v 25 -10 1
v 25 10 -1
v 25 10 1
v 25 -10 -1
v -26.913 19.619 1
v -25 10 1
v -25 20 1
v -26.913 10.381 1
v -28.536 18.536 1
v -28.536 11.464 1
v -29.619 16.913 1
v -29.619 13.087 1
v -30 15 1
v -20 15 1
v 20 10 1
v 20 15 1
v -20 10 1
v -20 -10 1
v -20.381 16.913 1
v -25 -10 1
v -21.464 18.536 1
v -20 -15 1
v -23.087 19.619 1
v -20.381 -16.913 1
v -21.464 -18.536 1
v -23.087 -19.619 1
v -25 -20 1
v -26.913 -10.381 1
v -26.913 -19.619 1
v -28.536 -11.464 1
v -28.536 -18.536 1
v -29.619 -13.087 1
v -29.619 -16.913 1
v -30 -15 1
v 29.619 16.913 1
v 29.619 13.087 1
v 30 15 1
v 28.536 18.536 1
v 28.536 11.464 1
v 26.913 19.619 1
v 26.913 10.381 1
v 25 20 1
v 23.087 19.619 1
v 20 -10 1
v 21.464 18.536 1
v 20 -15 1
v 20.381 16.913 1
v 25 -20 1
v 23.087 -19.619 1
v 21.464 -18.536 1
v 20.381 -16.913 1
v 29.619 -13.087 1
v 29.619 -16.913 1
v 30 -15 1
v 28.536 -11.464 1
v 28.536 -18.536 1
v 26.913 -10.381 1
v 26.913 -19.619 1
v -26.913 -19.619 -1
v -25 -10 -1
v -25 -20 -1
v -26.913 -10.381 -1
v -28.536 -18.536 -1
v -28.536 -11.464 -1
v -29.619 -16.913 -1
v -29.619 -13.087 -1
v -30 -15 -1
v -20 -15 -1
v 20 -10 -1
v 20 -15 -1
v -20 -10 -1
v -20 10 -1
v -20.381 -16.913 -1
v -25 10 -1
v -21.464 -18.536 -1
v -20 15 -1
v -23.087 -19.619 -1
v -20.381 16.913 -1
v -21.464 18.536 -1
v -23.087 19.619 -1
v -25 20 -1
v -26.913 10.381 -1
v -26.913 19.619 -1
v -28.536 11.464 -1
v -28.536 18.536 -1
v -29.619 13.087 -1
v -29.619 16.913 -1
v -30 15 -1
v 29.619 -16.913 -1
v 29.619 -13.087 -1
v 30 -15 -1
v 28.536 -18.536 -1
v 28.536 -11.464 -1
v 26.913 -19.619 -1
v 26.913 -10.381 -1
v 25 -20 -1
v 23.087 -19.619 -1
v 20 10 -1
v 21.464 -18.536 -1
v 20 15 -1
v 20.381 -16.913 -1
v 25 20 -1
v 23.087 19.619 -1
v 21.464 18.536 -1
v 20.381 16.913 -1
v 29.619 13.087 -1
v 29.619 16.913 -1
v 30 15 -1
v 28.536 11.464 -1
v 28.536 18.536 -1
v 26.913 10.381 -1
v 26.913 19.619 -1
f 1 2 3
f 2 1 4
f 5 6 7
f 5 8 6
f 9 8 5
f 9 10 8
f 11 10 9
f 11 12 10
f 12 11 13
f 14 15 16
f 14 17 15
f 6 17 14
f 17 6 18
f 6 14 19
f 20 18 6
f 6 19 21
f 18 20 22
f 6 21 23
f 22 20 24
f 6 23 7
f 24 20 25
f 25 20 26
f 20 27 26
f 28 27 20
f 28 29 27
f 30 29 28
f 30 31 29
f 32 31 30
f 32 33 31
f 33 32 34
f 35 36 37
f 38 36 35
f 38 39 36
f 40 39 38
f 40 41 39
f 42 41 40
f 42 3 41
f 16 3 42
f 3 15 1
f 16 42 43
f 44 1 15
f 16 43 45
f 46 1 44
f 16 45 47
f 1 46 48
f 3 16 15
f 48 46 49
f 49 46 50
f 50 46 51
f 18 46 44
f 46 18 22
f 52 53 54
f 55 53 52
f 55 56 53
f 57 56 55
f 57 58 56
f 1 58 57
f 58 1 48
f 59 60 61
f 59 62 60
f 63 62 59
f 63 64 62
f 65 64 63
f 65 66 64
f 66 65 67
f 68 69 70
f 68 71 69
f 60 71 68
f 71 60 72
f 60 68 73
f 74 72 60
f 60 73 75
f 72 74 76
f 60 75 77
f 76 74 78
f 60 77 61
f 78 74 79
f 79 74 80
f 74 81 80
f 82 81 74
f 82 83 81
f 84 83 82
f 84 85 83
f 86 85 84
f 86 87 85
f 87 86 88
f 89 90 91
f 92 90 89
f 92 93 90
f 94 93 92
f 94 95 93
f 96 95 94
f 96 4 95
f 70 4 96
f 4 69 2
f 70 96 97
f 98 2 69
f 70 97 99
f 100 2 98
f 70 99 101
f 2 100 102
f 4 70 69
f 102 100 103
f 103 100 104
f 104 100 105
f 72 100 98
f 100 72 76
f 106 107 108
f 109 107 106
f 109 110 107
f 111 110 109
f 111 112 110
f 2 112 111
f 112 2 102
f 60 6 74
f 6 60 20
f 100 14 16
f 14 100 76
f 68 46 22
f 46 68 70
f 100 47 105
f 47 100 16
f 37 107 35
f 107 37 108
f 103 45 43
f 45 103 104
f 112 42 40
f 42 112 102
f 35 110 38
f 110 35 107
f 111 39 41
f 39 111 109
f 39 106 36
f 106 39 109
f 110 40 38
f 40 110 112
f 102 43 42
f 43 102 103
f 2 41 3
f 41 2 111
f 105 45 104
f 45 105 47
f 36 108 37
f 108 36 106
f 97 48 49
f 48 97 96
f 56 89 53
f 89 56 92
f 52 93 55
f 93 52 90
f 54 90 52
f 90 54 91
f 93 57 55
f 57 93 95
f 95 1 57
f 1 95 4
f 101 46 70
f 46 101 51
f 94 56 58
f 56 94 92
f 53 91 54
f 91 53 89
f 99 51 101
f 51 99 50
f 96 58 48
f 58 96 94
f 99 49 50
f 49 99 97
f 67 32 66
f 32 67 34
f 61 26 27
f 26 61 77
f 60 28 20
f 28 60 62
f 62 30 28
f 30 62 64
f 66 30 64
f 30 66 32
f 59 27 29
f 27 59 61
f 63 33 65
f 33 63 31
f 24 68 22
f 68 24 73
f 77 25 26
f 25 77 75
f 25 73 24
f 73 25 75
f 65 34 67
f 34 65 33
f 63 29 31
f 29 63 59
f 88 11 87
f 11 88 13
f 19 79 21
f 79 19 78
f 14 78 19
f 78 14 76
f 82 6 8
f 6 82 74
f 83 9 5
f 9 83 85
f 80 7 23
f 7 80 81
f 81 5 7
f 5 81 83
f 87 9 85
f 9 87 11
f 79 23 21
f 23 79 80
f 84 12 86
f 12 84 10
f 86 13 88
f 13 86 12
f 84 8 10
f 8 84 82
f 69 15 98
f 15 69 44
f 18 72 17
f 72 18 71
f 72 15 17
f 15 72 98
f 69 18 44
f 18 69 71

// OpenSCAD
// Variable description

length      = 50    ;
width       = 30    ;
height      = 2     ;
diameter    = 10    ;
thickness   = 5     ;




  difference(){    
    union(){
        cube( size = [ length, width, height], center = true)   ;
        translate( [ length/2, width/2, 0] ){
            cylinder( h = height, d = diameter, center = true)  ;
        }
        translate( [ length/2, -width/2, 0] ){
            cylinder( h = height, d = diameter, center = true)  ;
        }
        translate( [ -length/2, -width/2, 0] ){
            cylinder( h = height, d = diameter, center = true)  ;
        }
        translate( [ -length/2, width/2, 0] ){
            cylinder( h = height, d = diameter, center = true)  ;
        }
    }
    
  cube( size = [ length-2*thickness, width-2*thickness, height+2], center = true) ; 
    
}   
    
    
    
    
